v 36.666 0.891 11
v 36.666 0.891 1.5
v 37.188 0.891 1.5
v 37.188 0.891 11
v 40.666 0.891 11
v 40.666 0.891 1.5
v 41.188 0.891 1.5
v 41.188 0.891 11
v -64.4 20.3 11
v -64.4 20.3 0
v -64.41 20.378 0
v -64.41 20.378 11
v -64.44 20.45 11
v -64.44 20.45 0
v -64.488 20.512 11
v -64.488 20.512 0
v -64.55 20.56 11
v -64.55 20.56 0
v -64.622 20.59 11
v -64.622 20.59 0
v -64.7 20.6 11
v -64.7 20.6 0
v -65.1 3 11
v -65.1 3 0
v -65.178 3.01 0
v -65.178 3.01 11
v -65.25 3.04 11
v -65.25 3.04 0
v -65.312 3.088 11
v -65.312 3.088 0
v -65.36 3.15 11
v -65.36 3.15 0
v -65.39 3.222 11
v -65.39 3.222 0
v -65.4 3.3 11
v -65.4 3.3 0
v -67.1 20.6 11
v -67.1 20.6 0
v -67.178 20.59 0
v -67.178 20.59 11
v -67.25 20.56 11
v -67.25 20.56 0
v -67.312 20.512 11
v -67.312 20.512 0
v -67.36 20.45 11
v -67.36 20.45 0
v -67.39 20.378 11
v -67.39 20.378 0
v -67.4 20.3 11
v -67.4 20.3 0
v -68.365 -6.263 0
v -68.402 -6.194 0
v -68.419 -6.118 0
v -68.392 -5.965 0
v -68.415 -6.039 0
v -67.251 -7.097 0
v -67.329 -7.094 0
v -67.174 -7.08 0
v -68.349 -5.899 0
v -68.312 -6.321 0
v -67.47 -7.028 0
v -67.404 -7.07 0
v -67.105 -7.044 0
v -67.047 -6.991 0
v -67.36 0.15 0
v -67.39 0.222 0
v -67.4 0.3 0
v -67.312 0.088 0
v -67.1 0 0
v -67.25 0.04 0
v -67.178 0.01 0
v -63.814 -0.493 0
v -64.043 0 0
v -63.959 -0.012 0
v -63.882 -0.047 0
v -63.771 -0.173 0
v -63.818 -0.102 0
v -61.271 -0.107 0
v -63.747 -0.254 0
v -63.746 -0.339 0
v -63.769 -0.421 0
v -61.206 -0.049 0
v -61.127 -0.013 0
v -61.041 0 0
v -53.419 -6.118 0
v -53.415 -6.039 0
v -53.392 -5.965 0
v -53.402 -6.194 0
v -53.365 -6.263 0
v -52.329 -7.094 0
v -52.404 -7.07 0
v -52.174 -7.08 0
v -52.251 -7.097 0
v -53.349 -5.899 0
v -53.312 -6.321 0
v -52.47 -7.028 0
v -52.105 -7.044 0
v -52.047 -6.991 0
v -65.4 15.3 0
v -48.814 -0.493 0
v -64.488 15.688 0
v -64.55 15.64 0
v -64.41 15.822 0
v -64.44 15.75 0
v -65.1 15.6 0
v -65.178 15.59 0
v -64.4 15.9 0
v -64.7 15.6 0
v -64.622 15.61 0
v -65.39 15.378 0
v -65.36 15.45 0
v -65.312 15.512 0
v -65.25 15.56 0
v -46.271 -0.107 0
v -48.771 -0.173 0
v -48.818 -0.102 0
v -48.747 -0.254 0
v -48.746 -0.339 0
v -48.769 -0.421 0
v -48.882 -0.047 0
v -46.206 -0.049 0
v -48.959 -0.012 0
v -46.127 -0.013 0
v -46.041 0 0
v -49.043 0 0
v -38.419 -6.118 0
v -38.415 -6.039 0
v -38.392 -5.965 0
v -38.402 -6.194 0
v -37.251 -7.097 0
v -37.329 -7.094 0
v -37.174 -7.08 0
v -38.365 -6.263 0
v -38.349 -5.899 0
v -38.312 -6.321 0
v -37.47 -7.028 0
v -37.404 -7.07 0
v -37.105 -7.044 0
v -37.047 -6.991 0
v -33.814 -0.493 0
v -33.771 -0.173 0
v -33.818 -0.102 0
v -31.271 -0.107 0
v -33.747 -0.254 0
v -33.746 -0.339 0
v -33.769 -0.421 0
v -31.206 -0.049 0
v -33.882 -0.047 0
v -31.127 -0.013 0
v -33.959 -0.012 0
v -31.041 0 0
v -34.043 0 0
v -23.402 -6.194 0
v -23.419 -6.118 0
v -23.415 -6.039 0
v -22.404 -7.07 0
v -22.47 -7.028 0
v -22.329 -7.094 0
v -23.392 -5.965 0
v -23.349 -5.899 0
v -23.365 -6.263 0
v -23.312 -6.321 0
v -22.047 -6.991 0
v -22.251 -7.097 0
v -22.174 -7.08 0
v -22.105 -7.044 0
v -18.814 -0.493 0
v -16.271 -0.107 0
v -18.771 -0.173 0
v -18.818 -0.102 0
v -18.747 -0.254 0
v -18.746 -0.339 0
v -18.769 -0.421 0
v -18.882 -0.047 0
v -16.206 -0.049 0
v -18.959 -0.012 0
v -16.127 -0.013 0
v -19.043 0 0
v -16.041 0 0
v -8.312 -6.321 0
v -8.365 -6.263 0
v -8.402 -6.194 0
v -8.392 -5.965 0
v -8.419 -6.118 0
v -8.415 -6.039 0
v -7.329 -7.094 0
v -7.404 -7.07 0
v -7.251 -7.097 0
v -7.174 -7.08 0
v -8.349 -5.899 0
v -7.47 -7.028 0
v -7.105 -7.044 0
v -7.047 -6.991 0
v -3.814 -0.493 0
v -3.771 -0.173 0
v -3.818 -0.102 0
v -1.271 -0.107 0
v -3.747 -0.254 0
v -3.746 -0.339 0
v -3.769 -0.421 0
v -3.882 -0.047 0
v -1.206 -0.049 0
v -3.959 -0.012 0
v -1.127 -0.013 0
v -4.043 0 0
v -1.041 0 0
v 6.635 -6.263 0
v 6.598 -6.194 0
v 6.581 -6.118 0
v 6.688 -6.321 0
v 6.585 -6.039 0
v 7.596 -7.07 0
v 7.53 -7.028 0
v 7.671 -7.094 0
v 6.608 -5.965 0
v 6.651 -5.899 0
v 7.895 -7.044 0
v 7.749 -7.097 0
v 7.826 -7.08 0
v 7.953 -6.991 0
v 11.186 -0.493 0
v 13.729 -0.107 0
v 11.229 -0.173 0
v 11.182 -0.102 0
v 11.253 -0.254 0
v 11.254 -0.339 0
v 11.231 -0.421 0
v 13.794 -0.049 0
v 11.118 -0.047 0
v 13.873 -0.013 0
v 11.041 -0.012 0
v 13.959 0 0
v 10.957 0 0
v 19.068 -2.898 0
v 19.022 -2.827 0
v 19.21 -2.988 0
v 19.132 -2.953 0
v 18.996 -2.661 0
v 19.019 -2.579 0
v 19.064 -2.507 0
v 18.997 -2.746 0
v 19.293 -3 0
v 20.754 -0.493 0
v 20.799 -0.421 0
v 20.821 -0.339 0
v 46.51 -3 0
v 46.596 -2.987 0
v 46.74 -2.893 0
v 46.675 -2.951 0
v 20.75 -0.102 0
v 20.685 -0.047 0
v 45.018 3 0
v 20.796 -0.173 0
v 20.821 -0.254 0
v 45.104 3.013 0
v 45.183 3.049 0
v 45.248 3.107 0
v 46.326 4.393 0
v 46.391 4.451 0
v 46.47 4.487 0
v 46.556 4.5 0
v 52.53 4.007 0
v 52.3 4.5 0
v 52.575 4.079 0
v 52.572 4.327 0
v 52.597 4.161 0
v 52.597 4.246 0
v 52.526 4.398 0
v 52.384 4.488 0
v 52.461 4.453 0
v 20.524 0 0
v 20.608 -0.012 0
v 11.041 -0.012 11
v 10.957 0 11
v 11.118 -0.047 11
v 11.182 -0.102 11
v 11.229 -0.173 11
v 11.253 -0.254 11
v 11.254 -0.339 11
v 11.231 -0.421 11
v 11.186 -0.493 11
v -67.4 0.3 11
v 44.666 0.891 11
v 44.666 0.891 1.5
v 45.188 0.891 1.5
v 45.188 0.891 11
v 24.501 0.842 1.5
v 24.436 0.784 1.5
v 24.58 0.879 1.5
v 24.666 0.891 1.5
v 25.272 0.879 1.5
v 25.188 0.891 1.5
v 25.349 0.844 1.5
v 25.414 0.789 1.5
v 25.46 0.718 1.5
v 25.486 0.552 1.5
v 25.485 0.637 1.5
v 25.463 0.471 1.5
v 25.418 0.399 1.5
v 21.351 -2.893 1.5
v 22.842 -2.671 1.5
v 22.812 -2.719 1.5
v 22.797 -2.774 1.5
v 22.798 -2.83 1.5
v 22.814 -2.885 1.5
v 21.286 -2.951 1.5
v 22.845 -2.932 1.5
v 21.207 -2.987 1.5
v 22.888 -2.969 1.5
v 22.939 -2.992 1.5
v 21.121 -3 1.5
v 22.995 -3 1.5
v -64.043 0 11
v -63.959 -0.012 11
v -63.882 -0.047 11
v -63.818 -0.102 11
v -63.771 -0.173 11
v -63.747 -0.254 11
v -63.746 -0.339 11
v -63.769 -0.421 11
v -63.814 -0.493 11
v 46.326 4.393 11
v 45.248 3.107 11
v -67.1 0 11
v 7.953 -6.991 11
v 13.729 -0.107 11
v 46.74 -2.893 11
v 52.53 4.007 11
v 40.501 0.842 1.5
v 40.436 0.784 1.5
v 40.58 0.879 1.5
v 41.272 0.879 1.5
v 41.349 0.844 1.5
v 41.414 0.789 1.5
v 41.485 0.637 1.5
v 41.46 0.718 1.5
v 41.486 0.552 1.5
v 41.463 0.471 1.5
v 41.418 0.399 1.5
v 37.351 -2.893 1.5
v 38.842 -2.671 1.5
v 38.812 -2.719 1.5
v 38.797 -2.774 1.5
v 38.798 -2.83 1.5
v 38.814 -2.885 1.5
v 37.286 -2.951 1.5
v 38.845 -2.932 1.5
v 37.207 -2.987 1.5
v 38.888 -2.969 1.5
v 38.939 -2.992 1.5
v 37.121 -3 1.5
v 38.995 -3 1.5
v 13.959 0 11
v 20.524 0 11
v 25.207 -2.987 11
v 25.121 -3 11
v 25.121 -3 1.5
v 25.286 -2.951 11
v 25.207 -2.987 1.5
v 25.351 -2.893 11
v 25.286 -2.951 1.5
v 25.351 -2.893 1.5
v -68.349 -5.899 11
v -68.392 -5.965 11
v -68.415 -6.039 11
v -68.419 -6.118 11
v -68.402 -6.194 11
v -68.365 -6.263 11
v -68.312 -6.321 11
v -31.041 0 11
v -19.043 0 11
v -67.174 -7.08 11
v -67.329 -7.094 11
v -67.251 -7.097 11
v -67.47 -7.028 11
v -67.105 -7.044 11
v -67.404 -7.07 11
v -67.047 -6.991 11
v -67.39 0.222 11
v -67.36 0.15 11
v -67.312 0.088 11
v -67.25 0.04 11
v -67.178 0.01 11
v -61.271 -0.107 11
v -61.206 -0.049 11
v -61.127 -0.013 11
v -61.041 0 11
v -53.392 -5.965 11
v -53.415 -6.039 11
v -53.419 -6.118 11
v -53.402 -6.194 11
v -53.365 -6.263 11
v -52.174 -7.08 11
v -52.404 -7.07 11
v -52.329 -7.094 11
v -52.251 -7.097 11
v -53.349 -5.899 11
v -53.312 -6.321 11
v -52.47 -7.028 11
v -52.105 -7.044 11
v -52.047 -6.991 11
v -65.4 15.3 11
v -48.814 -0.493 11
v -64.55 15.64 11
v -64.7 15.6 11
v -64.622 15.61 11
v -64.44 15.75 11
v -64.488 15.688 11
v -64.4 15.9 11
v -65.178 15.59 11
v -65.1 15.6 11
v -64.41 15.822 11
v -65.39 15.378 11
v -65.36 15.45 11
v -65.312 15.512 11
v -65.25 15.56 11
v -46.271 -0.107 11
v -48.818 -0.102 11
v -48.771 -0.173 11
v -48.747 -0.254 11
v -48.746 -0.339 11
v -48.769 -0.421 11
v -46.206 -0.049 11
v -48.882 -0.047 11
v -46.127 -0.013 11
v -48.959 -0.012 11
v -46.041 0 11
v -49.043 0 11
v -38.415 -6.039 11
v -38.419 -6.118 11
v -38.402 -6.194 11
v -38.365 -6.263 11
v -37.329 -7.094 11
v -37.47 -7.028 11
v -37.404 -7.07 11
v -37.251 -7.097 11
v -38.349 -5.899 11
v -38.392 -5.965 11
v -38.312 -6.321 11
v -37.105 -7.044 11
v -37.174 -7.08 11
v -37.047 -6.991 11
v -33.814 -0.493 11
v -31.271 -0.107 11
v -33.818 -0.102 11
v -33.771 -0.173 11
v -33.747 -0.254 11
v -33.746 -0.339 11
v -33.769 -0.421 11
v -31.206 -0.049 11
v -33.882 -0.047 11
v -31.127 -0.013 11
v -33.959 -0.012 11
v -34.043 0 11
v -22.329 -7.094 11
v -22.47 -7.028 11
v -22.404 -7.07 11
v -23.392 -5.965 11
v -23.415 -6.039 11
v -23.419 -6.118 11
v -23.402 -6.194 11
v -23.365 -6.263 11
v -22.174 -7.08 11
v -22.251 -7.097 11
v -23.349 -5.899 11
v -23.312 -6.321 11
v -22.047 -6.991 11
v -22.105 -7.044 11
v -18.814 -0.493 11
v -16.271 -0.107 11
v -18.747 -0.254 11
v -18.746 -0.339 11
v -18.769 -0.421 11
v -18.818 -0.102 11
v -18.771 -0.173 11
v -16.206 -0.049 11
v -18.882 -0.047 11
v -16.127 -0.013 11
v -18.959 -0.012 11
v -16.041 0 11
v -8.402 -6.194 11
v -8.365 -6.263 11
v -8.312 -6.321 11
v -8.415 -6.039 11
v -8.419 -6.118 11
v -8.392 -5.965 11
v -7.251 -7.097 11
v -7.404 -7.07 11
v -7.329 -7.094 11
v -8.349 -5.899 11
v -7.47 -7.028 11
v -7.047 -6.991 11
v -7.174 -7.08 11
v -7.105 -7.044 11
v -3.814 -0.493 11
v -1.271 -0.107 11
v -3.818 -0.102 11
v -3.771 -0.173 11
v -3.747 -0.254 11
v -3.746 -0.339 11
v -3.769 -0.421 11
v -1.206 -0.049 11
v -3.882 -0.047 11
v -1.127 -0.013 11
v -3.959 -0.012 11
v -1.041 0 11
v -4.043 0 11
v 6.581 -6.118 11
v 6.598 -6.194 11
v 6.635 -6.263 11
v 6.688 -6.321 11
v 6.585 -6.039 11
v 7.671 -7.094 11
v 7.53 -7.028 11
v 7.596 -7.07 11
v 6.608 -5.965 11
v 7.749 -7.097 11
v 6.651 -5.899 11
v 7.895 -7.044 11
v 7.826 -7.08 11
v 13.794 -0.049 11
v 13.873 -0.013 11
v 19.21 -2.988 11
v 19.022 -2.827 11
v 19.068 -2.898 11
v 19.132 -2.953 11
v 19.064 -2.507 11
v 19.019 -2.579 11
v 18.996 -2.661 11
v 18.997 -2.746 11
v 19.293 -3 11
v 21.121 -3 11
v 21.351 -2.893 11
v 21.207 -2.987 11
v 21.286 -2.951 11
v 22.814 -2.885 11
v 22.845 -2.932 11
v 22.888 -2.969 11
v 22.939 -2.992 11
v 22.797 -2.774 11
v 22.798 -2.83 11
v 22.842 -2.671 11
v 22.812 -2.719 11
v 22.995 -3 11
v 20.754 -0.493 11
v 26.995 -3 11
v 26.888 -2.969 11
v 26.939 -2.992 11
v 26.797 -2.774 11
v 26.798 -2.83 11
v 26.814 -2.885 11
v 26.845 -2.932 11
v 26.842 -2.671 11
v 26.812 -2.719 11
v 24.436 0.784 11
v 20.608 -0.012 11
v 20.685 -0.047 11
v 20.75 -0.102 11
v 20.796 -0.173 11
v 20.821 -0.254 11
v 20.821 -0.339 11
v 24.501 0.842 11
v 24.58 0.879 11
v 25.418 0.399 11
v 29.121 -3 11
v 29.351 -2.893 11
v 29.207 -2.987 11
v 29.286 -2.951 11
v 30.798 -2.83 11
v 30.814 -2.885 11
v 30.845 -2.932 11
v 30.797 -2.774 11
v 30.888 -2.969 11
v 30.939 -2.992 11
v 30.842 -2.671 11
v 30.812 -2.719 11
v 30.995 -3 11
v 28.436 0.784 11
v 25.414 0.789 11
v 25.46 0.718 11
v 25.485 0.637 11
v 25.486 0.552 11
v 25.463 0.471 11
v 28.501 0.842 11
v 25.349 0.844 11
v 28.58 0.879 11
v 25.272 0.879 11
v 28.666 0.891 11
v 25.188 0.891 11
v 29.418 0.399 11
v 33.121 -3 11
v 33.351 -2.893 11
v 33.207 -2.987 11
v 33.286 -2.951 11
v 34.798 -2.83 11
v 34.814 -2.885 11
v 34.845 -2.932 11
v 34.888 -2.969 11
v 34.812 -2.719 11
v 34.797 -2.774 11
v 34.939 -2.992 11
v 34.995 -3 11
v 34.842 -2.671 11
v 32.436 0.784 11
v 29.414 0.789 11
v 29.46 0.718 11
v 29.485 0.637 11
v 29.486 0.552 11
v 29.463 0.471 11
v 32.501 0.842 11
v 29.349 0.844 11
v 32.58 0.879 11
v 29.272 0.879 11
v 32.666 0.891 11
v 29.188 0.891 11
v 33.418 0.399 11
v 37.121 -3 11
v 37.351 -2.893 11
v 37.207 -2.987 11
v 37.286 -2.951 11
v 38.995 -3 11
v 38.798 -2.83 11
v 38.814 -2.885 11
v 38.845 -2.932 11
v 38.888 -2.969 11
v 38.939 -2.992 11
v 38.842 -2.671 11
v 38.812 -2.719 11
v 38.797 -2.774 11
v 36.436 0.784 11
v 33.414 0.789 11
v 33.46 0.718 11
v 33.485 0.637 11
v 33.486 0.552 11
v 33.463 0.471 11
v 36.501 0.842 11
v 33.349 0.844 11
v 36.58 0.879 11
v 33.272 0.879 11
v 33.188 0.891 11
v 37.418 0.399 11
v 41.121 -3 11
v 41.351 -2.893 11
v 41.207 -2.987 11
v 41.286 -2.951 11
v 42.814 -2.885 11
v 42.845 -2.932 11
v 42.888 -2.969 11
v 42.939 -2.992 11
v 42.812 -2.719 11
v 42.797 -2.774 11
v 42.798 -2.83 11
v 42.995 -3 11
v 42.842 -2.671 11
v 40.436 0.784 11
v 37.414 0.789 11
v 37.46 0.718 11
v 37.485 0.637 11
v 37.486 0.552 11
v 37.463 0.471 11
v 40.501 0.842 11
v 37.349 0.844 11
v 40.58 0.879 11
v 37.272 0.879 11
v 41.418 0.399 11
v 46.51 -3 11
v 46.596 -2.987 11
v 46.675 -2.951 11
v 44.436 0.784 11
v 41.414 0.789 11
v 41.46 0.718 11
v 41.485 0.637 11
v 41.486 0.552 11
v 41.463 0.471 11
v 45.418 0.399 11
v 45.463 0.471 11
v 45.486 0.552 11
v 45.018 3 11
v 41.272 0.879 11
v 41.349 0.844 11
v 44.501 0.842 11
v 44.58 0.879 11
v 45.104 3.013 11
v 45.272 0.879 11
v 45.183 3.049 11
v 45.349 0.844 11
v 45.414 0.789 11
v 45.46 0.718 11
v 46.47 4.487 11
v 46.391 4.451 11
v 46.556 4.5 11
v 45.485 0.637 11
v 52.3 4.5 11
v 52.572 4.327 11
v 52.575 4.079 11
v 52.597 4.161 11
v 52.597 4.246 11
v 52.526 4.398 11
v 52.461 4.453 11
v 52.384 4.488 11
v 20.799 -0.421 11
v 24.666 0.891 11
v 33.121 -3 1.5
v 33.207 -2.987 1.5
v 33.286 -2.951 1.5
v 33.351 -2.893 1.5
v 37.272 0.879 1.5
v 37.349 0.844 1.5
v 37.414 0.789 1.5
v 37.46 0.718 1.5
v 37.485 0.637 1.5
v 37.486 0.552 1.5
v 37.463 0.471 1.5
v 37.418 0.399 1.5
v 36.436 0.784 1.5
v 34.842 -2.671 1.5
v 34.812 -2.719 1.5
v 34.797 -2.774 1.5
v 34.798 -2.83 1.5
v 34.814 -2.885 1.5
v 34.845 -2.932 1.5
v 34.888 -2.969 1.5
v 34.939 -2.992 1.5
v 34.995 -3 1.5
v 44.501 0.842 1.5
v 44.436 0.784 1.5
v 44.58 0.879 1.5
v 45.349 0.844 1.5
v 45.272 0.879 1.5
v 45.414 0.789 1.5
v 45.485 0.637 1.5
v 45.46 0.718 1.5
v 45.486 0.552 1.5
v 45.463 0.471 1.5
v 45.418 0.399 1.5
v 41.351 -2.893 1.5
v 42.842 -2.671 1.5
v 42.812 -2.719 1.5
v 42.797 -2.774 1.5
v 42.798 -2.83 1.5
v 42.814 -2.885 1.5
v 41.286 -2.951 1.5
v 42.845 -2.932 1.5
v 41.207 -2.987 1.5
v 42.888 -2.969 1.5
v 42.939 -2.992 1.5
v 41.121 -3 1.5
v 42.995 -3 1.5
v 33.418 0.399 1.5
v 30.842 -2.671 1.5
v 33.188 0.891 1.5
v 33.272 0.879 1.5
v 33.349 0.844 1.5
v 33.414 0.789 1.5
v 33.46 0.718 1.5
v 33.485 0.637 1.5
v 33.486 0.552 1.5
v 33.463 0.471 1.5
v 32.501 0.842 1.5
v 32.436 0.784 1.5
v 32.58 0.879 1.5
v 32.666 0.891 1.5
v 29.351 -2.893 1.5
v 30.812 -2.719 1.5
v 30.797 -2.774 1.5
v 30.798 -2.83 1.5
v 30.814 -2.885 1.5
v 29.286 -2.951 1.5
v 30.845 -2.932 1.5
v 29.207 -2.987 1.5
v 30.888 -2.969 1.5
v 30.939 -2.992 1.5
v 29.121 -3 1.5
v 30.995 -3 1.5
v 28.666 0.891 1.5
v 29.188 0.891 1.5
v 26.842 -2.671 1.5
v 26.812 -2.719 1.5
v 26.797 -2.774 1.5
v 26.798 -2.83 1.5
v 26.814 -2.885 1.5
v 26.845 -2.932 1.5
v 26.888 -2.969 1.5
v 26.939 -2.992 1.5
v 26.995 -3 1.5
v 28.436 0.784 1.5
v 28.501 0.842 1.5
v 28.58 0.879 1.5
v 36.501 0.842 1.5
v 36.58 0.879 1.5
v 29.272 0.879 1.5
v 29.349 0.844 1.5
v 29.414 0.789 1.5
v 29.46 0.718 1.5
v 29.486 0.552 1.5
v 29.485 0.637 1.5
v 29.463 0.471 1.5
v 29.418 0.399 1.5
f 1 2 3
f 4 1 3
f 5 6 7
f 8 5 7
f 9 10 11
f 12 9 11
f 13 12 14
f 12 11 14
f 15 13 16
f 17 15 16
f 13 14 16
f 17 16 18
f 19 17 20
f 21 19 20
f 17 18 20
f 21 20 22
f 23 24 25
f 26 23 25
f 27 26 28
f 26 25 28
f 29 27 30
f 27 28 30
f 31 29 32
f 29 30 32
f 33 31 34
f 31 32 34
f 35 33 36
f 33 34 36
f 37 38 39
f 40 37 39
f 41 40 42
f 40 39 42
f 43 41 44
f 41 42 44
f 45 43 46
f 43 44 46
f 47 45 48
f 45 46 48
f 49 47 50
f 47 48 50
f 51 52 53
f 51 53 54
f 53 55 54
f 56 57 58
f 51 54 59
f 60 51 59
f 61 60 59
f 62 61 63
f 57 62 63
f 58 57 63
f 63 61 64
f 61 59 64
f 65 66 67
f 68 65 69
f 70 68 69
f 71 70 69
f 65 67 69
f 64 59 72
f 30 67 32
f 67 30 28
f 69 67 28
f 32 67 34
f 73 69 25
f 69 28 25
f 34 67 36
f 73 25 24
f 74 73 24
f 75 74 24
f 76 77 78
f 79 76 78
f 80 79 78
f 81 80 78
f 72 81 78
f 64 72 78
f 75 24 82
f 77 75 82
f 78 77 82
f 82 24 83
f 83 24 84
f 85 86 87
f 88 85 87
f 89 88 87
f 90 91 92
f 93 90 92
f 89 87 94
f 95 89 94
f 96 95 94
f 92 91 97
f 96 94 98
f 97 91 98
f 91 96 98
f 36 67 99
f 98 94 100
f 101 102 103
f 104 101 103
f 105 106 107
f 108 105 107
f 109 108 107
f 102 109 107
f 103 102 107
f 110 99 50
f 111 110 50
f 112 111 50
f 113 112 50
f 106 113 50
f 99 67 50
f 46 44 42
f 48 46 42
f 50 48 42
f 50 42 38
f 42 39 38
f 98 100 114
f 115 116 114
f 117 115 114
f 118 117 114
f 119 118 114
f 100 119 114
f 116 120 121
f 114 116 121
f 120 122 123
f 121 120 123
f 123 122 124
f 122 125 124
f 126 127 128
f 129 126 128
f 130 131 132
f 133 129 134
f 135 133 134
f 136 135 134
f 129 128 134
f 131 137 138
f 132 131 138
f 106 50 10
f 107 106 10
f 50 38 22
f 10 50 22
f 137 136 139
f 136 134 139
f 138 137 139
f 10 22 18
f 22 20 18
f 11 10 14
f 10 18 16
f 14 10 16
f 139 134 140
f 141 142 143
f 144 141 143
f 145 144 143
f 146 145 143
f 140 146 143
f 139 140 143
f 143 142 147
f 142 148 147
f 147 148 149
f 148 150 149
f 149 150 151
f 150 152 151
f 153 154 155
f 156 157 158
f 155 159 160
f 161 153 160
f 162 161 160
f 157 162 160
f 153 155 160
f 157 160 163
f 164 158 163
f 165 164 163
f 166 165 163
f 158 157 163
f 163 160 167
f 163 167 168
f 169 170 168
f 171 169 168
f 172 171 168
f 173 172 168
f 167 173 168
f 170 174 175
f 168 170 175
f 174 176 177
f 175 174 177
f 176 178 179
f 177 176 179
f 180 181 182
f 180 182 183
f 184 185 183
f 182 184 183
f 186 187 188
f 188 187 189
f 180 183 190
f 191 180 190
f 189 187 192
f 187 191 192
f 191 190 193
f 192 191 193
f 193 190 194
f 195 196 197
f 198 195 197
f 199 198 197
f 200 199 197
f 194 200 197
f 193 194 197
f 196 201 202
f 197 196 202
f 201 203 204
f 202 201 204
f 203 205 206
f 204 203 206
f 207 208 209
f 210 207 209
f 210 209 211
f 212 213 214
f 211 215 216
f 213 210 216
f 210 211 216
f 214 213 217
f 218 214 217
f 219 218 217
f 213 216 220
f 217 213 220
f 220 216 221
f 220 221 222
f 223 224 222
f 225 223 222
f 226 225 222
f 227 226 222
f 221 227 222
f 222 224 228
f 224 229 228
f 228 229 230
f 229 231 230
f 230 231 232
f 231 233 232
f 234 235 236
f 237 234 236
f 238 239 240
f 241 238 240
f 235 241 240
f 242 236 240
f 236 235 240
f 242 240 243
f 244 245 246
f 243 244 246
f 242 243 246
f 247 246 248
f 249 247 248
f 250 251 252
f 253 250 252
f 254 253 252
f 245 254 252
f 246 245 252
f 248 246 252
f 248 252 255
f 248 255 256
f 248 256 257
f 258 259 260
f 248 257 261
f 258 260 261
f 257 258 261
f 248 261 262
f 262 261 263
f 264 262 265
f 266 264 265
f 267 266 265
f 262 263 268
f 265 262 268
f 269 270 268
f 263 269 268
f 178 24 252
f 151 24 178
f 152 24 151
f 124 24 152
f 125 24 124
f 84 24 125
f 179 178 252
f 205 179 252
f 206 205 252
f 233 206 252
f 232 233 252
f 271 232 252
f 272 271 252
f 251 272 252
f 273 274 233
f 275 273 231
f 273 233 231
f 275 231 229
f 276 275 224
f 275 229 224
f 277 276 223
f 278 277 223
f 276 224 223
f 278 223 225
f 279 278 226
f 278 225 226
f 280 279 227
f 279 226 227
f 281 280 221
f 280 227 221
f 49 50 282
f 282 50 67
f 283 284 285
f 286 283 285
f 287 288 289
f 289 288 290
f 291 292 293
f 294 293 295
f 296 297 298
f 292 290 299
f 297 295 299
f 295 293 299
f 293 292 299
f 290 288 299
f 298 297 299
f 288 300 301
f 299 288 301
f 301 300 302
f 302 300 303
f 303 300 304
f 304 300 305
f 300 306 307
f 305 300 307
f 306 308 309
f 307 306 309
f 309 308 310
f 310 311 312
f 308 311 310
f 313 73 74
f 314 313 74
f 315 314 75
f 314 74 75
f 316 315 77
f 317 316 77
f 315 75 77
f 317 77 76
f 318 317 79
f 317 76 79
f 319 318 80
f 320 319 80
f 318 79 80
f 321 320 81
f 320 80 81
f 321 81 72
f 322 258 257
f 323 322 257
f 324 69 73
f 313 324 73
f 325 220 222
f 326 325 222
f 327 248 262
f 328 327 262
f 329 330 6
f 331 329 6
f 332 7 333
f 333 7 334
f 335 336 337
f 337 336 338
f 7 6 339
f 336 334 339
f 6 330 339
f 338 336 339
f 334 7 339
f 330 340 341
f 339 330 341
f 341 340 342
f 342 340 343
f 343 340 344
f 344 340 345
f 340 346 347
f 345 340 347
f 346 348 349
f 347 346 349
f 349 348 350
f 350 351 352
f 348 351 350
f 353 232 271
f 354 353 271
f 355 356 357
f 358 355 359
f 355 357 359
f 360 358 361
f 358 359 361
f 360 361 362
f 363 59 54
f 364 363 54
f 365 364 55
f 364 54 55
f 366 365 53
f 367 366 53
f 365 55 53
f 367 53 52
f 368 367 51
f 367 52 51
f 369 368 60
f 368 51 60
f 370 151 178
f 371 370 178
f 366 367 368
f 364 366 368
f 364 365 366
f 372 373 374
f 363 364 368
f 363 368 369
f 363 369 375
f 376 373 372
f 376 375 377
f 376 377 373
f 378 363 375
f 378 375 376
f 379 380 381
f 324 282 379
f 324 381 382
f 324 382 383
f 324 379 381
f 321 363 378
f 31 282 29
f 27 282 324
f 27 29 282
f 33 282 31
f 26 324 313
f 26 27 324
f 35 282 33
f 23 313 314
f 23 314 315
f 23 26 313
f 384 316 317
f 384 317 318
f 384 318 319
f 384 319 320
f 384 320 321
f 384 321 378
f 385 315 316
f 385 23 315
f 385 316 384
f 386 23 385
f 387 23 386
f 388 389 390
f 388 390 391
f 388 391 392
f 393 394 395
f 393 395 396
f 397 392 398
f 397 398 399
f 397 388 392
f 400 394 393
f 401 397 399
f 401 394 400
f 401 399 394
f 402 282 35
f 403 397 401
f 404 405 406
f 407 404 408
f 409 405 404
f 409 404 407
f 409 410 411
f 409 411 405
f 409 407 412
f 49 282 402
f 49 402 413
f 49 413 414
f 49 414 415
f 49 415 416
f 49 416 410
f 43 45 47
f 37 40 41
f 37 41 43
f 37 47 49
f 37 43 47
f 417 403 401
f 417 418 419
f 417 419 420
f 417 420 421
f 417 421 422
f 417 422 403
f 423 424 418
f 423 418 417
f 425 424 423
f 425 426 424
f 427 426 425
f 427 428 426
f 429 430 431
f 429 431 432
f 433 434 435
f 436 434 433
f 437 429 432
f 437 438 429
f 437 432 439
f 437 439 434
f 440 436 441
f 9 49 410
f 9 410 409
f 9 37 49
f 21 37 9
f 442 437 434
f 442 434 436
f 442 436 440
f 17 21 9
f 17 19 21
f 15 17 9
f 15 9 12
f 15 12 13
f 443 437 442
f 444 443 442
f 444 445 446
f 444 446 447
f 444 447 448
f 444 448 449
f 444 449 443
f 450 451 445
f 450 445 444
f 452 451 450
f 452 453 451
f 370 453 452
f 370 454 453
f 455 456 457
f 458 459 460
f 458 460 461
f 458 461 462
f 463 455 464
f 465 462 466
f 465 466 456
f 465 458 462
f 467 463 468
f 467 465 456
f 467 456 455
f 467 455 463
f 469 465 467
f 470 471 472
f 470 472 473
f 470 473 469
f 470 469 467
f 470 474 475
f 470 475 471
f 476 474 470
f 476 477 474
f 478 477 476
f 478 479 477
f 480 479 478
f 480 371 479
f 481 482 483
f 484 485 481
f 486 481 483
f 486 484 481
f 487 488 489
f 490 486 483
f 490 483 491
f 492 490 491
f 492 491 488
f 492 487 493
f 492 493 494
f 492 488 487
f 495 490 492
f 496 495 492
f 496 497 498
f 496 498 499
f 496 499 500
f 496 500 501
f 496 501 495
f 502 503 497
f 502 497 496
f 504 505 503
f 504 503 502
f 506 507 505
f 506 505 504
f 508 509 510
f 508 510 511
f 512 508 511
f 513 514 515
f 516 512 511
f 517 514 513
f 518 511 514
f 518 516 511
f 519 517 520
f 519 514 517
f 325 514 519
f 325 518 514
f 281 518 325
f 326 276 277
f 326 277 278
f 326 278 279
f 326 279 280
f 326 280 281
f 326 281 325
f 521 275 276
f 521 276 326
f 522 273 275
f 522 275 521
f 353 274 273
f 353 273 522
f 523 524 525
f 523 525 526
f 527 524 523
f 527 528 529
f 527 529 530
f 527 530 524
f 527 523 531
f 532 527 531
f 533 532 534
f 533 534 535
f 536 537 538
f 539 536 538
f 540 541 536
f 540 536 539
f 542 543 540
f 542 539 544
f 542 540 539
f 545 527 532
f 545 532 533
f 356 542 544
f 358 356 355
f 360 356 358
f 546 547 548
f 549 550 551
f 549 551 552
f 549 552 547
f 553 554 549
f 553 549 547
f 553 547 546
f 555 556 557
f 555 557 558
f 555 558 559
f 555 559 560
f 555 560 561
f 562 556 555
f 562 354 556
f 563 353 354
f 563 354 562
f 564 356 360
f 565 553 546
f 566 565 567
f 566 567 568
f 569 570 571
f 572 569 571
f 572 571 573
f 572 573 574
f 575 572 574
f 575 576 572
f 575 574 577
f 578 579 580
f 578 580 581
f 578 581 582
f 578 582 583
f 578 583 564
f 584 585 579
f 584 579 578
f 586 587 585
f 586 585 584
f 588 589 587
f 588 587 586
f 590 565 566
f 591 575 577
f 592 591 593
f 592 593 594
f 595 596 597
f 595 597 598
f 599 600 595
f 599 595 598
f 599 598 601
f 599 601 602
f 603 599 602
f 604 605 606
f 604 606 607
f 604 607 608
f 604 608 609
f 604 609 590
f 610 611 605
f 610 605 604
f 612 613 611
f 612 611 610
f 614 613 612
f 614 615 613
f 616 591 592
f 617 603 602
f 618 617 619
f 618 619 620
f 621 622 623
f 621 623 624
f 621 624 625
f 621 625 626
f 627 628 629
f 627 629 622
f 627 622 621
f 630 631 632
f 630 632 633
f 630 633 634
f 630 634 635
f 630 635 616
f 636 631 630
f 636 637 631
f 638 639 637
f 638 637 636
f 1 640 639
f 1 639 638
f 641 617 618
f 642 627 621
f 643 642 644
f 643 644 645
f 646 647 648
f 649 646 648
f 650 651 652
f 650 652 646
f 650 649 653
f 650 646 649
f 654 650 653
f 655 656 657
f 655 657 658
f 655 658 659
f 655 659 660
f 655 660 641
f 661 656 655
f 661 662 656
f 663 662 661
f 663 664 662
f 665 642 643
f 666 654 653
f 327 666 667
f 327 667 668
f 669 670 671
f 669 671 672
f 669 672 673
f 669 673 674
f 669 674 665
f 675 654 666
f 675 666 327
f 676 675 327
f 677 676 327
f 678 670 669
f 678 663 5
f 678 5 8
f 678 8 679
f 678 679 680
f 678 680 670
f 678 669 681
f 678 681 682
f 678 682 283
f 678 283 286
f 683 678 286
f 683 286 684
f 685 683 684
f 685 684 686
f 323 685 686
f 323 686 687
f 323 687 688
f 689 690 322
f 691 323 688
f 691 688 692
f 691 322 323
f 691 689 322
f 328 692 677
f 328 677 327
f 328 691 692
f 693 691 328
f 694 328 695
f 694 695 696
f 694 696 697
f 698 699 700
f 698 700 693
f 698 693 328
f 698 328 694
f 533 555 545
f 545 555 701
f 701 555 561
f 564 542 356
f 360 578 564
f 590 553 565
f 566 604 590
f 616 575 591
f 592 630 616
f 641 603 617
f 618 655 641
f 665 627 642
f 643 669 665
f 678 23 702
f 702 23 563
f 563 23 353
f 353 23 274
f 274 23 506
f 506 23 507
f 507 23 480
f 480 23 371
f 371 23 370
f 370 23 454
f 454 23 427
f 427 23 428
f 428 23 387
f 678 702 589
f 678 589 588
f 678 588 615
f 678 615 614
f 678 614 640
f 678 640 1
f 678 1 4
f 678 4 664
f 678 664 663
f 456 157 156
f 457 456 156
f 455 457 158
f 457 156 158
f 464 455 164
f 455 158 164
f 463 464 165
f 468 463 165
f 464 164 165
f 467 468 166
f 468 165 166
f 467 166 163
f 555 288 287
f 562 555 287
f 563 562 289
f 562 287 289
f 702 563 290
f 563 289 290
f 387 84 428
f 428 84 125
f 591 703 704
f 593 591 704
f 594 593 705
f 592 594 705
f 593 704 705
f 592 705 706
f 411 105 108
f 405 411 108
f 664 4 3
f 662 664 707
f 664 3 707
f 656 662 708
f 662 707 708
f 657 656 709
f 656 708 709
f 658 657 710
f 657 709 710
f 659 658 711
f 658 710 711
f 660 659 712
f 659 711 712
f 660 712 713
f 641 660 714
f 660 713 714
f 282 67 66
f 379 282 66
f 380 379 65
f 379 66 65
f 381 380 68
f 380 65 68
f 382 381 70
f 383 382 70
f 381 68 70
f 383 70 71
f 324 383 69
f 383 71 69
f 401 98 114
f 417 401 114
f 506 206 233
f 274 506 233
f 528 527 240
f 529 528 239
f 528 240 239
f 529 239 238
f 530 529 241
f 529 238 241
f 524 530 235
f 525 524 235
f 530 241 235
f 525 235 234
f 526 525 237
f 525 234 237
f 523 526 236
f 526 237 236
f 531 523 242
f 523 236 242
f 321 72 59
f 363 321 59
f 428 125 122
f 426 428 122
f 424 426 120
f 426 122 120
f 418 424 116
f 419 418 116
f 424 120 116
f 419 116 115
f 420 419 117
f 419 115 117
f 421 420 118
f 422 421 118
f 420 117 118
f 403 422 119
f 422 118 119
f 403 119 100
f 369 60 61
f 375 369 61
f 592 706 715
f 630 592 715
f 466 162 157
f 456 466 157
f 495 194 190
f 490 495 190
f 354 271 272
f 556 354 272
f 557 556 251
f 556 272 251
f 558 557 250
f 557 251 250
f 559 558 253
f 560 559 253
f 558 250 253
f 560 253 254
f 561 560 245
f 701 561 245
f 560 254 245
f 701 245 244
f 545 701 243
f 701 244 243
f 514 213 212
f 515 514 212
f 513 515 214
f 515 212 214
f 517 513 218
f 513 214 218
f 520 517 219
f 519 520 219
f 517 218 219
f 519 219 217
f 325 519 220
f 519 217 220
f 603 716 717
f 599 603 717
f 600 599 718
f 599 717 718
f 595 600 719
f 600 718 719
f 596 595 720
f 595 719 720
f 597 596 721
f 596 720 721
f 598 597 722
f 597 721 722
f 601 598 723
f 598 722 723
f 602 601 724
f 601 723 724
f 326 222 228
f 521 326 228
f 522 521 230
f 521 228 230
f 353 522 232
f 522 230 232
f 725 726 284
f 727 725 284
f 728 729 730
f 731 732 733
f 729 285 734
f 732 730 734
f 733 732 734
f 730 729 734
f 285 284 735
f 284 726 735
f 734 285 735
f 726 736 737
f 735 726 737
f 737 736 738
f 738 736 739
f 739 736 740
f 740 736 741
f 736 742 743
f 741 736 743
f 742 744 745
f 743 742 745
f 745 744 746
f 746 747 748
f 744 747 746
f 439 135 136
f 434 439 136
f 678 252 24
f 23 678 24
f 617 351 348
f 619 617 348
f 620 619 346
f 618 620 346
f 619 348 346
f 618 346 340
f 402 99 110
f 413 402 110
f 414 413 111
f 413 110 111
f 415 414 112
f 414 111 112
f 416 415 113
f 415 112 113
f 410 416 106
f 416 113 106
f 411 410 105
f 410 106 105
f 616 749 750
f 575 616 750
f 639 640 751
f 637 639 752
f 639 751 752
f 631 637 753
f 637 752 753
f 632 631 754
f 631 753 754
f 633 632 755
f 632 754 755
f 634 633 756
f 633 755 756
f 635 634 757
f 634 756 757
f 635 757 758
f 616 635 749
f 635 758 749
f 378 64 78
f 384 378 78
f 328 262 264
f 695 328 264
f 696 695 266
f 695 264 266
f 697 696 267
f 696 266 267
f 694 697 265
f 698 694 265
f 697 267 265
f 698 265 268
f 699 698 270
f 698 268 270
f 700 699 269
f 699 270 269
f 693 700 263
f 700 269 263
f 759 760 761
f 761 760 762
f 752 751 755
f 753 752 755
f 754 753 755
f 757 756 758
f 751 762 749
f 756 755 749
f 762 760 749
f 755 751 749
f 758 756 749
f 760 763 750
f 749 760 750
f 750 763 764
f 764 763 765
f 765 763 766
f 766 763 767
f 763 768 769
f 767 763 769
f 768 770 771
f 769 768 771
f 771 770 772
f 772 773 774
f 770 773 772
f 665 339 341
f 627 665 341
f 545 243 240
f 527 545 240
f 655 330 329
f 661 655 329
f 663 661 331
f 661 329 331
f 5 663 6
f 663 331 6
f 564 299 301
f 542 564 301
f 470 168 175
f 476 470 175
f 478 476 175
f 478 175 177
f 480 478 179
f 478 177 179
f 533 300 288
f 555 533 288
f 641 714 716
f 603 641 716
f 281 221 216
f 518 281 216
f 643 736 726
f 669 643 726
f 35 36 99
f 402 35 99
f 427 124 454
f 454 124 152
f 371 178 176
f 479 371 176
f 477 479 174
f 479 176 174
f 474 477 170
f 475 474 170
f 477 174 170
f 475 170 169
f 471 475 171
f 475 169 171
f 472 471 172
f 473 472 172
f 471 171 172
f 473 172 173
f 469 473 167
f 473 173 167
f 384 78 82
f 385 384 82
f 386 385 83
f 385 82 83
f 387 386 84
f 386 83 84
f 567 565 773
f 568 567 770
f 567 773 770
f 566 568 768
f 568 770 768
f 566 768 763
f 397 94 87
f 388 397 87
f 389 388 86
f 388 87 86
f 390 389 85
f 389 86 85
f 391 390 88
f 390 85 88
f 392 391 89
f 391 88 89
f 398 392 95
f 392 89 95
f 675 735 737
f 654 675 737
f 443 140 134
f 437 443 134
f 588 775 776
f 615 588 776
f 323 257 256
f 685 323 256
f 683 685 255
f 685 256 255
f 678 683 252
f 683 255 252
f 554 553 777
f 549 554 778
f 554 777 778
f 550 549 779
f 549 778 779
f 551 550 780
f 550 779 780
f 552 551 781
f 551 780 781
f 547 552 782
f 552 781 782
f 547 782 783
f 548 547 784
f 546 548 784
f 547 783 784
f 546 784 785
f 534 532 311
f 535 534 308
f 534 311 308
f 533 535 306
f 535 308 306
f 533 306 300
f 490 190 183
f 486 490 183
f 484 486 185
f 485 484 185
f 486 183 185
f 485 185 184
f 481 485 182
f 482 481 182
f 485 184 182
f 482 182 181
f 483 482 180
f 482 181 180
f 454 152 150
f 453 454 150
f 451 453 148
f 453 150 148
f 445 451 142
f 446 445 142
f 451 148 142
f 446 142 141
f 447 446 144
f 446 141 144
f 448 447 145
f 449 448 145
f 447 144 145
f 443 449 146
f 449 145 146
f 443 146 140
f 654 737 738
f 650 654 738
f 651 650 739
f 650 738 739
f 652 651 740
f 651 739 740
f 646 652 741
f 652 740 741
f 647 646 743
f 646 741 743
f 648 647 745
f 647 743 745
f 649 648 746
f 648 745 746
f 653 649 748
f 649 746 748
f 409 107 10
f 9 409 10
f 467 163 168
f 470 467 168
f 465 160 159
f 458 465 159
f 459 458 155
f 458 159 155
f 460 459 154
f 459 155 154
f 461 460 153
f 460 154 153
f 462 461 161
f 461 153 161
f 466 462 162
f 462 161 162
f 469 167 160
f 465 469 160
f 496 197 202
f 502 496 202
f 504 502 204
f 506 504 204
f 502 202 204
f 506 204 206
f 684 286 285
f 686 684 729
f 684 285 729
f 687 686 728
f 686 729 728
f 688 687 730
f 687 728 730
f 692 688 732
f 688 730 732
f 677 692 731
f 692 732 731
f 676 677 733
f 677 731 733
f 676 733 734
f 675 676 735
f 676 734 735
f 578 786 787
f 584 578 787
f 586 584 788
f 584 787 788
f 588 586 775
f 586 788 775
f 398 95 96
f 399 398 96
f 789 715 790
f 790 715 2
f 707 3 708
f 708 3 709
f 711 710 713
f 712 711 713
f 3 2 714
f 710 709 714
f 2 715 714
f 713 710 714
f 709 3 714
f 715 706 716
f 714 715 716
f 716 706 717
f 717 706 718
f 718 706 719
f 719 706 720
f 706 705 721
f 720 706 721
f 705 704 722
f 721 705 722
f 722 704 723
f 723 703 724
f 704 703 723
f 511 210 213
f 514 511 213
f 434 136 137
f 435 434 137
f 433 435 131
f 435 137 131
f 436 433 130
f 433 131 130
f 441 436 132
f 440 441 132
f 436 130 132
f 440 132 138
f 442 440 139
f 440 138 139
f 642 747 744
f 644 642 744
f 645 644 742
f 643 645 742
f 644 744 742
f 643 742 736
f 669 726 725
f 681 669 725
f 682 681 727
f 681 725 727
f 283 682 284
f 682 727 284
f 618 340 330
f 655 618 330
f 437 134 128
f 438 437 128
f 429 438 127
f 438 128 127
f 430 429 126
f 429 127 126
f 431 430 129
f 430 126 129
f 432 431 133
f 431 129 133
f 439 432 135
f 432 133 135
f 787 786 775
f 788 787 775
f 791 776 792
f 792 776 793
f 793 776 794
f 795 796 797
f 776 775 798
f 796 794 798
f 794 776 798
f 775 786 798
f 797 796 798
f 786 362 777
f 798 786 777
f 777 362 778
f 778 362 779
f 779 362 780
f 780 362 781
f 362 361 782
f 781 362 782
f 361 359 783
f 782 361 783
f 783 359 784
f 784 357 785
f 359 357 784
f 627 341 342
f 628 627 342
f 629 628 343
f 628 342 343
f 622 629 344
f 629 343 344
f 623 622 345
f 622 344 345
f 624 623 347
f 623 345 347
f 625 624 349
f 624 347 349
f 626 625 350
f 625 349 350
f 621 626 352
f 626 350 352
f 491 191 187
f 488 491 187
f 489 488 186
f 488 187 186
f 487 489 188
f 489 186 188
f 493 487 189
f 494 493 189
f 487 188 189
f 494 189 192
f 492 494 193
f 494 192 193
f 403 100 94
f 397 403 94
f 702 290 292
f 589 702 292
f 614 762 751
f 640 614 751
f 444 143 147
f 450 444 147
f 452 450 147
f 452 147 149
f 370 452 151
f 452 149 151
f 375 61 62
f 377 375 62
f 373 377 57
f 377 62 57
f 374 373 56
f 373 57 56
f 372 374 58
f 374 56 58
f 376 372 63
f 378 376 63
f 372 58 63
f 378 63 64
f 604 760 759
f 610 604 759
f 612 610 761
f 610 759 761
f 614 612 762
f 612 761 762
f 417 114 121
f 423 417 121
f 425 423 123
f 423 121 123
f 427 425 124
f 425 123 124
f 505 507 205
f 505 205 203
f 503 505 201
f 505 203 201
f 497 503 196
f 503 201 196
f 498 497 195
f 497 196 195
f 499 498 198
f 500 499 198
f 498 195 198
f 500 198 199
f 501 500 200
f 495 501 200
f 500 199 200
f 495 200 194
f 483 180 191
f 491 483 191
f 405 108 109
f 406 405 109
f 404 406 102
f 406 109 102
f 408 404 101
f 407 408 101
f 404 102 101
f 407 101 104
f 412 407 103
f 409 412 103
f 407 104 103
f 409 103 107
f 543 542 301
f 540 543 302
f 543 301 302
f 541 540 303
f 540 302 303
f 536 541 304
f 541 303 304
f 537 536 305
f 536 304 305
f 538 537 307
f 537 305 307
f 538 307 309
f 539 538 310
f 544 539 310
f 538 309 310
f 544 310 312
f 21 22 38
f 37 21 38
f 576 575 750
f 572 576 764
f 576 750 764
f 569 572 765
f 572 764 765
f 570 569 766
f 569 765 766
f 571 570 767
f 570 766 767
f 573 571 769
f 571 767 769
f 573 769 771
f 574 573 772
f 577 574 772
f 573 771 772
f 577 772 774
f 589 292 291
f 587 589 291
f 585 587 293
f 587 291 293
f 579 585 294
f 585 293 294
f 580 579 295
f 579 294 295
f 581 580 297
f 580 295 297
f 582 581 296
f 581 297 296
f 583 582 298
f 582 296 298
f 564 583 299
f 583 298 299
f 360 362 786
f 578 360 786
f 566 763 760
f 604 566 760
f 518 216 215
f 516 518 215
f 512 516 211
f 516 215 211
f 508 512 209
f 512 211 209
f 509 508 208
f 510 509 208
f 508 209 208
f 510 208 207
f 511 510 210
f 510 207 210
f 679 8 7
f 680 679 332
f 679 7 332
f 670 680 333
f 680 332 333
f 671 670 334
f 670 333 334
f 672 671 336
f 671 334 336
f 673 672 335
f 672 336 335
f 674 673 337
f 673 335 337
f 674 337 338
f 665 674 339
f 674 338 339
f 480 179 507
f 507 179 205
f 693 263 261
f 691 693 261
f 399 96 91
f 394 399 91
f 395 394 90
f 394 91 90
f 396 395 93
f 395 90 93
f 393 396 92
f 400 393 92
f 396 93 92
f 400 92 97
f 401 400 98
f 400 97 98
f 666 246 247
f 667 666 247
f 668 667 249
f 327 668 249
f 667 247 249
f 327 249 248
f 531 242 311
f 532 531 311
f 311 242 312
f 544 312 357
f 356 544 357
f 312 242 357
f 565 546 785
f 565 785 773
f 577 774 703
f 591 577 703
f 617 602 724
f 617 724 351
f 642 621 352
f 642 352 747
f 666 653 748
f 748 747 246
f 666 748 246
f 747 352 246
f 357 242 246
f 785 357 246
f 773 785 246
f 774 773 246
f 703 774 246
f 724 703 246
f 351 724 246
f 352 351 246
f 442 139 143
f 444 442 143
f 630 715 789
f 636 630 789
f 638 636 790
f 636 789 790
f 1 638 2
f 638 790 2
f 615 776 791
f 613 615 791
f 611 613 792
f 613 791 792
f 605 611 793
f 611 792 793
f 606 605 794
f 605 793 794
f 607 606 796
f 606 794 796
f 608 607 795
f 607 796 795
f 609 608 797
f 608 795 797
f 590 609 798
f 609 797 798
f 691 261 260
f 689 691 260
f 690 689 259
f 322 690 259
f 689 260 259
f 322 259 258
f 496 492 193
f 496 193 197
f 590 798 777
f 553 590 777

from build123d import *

# Parameters (mm, degrees)
F1_DEPTH = 11
F3_DEPTH = 1.5


with BuildPart() as f1:
    # F0 (on Top) → F1 (new body)
    with BuildSketch(Plane.XY):
        with BuildLine():
            ThreePointArc((-67.1, 20.6), (-67.312132, 20.512132), (-67.4, 20.3))
            Line((-67.4, 20.3), (-67.4, 0.3))
            ThreePointArc((-67.4, 0.3), (-67.312132, 0.087868), (-67.1, 0))
            Line((-67.1, 0), (-64.043352, 0))
            ThreePointArc((-64.043352, 0), (-63.77146, -0.173215), (-63.813539, -0.492836))
            Line((-63.813539, -0.492836), (-68.349465, -5.898542))
            ThreePointArc((-68.349465, -5.898542), (-68.41851, -6.117525), (-68.312488, -6.321192))
            Line((-68.312488, -6.321192), (-67.469839, -7.028258))
            ThreePointArc((-67.469839, -7.028258), (-67.250856, -7.097303), (-67.047189, -6.991281))
            Line((-67.047189, -6.991281), (-61.270729, -0.107164))
            ThreePointArc((-61.270729, -0.107164), (-61.167701, -0.028108), (-61.040915, 0))
            Line((-61.040915, 0), (-49.043352, 0))
            ThreePointArc((-49.043352, 0), (-48.77146, -0.173215), (-48.813539, -0.492836))
            Line((-48.813539, -0.492836), (-53.349465, -5.898542))
            ThreePointArc((-53.349465, -5.898542), (-53.41851, -6.117525), (-53.312488, -6.321192))
            Line((-53.312488, -6.321192), (-52.469839, -7.028258))
            ThreePointArc((-52.469839, -7.028258), (-52.250856, -7.097303), (-52.047189, -6.991281))
            Line((-52.047189, -6.991281), (-46.270729, -0.107164))
            ThreePointArc((-46.270729, -0.107164), (-46.167701, -0.028108), (-46.040915, 0))
            Line((-46.040915, 0), (-34.043352, 0))
            ThreePointArc((-34.043352, 0), (-33.77146, -0.173215), (-33.813539, -0.492836))
            Line((-33.813539, -0.492836), (-38.349465, -5.898542))
            ThreePointArc((-38.349465, -5.898542), (-38.41851, -6.117525), (-38.312488, -6.321192))
            Line((-38.312488, -6.321192), (-37.469839, -7.028258))
            ThreePointArc((-37.469839, -7.028258), (-37.250856, -7.097303), (-37.047189, -6.991281))
            Line((-37.047189, -6.991281), (-31.270729, -0.107164))
            ThreePointArc((-31.270729, -0.107164), (-31.167701, -0.028108), (-31.040915, 0))
            Line((-31.040915, 0), (-19.043352, 0))
            ThreePointArc((-19.043352, 0), (-18.77146, -0.173215), (-18.813539, -0.492836))
            Line((-18.813539, -0.492836), (-23.349465, -5.898542))
            ThreePointArc((-23.349465, -5.898542), (-23.41851, -6.117525), (-23.312488, -6.321192))
            Line((-23.312488, -6.321192), (-22.469839, -7.028258))
            ThreePointArc((-22.469839, -7.028258), (-22.250856, -7.097303), (-22.047189, -6.991281))
            Line((-22.047189, -6.991281), (-16.270729, -0.107164))
            ThreePointArc((-16.270729, -0.107164), (-16.167701, -0.028108), (-16.040915, 0))
            Line((-16.040915, 0), (-4.043352, 0))
            ThreePointArc((-4.043352, 0), (-3.77146, -0.173215), (-3.813539, -0.492836))
            Line((-3.813539, -0.492836), (-8.349465, -5.898542))
            ThreePointArc((-8.349465, -5.898542), (-8.41851, -6.117525), (-8.312488, -6.321192))
            Line((-8.312488, -6.321192), (-7.469839, -7.028258))
            ThreePointArc((-7.469839, -7.028258), (-7.250856, -7.097303), (-7.047189, -6.991281))
            Line((-7.047189, -6.991281), (-1.270729, -0.107164))
            ThreePointArc((-1.270729, -0.107164), (-1.167701, -0.028108), (-1.040915, 0))
            Line((-1.040915, 0), (10.956648, 0))
            ThreePointArc((10.956648, 0), (11.22854, -0.173215), (11.186461, -0.492836))
            Line((11.186461, -0.492836), (6.650535, -5.898542))
            ThreePointArc((6.650535, -5.898542), (6.58149, -6.117525), (6.687512, -6.321192))
            Line((6.687512, -6.321192), (7.530161, -7.028258))
            ThreePointArc((7.530161, -7.028258), (7.749144, -7.097303), (7.952811, -6.991281))
            Line((7.952811, -6.991281), (13.729271, -0.107164))
            ThreePointArc((13.729271, -0.107164), (13.832299, -0.028108), (13.959085, 0))
            Line((13.959085, 0), (20.524052, 0))
            ThreePointArc((20.524052, 0), (20.795944, -0.173215), (20.753865, -0.492836))
            Line((20.753865, -0.492836), (19.063644, -2.507164))
            ThreePointArc((19.063644, -2.507164), (19.021565, -2.826785), (19.293457, -3))
            Line((19.293457, -3), (21.121027, -3))
            ThreePointArc((21.121027, -3), (21.247813, -2.971892), (21.35084, -2.892836))
            Line((21.35084, -2.892836), (24.436221, 0.784177))
            ThreePointArc((24.436221, 0.784177), (24.539249, 0.863233), (24.666034, 0.891341))
            Line((24.666034, 0.891341), (25.188197, 0.891341))
            ThreePointArc((25.188197, 0.891341), (25.46009, 0.718126), (25.418011, 0.398504))
            Line((25.418011, 0.398504), (22.842019, -2.671442))
            ThreePointArc((22.842019, -2.671442), (22.813967, -2.884524), (22.995228, -3))
            Line((22.995228, -3), (25.121027, -3))
            ThreePointArc((25.121027, -3), (25.247813, -2.971892), (25.35084, -2.892836))
            Line((25.35084, -2.892836), (28.436221, 0.784177))
            ThreePointArc((28.436221, 0.784177), (28.539249, 0.863233), (28.666034, 0.891341))
            Line((28.666034, 0.891341), (29.188197, 0.891341))
            ThreePointArc((29.188197, 0.891341), (29.46009, 0.718126), (29.418011, 0.398504))
            Line((29.418011, 0.398504), (26.842019, -2.671442))
            ThreePointArc((26.842019, -2.671442), (26.813967, -2.884524), (26.995228, -3))
            Line((26.995228, -3), (29.121027, -3))
            ThreePointArc((29.121027, -3), (29.247813, -2.971892), (29.35084, -2.892836))
            Line((29.35084, -2.892836), (32.436221, 0.784177))
            ThreePointArc((32.436221, 0.784177), (32.539249, 0.863233), (32.666034, 0.891341))
            Line((32.666034, 0.891341), (33.188197, 0.891341))
            ThreePointArc((33.188197, 0.891341), (33.46009, 0.718126), (33.418011, 0.398504))
            Line((33.418011, 0.398504), (30.842019, -2.671442))
            ThreePointArc((30.842019, -2.671442), (30.813967, -2.884524), (30.995228, -3))
            Line((30.995228, -3), (33.121027, -3))
            ThreePointArc((33.121027, -3), (33.247813, -2.971892), (33.35084, -2.892836))
            Line((33.35084, -2.892836), (36.436221, 0.784177))
            ThreePointArc((36.436221, 0.784177), (36.539249, 0.863233), (36.666034, 0.891341))
            Line((36.666034, 0.891341), (37.188197, 0.891341))
            ThreePointArc((37.188197, 0.891341), (37.46009, 0.718126), (37.418011, 0.398504))
            Line((37.418011, 0.398504), (34.842019, -2.671442))
            ThreePointArc((34.842019, -2.671442), (34.813967, -2.884524), (34.995228, -3))
            Line((34.995228, -3), (37.121027, -3))
            ThreePointArc((37.121027, -3), (37.247813, -2.971892), (37.35084, -2.892836))
            Line((37.35084, -2.892836), (40.436221, 0.784177))
            ThreePointArc((40.436221, 0.784177), (40.539249, 0.863233), (40.666034, 0.891341))
            Line((40.666034, 0.891341), (41.188197, 0.891341))
            ThreePointArc((41.188197, 0.891341), (41.46009, 0.718126), (41.418011, 0.398504))
            Line((41.418011, 0.398504), (38.842019, -2.671442))
            ThreePointArc((38.842019, -2.671442), (38.813967, -2.884524), (38.995228, -3))
            Line((38.995228, -3), (41.121027, -3))
            ThreePointArc((41.121027, -3), (41.247813, -2.971892), (41.35084, -2.892836))
            Line((41.35084, -2.892836), (44.436221, 0.784177))
            ThreePointArc((44.436221, 0.784177), (44.539249, 0.863233), (44.666034, 0.891341))
            Line((44.666034, 0.891341), (45.188197, 0.891341))
            ThreePointArc((45.188197, 0.891341), (45.46009, 0.718126), (45.418011, 0.398504))
            Line((45.418011, 0.398504), (42.842019, -2.671442))
            ThreePointArc((42.842019, -2.671442), (42.813967, -2.884524), (42.995228, -3))
            Line((42.995228, -3), (46.510213, -3))
            ThreePointArc((46.510213, -3), (46.636998, -2.971892), (46.740026, -2.892836))
            Line((46.740026, -2.892836), (52.529813, 4.007164))
            ThreePointArc((52.529813, 4.007164), (52.571892, 4.326785), (52.3, 4.5))
            Line((52.3, 4.5), (46.556208, 4.5))
            ThreePointArc((46.556208, 4.5), (46.429422, 4.471892), (46.326395, 4.392836))
            Line((46.326395, 4.392836), (45.247587, 3.107164))
            ThreePointArc((45.247587, 3.107164), (45.144559, 3.028108), (45.017774, 3))
            Line((45.017774, 3), (-65.1, 3))
            ThreePointArc((-65.1, 3), (-65.312132, 3.087868), (-65.4, 3.3))
            Line((-65.4, 3.3), (-65.4, 15.3))
            ThreePointArc((-65.4, 15.3), (-65.312132, 15.512132), (-65.1, 15.6))
            Line((-65.1, 15.6), (-64.7, 15.6))
            ThreePointArc((-64.7, 15.6), (-64.487868, 15.687868), (-64.4, 15.9))
            Line((-64.4, 15.9), (-64.4, 20.3))
            ThreePointArc((-64.4, 20.3), (-64.487868, 20.512132), (-64.7, 20.6))
            Line((-64.7, 20.6), (-67.1, 20.6))
        make_face()
    extrude(amount=F1_DEPTH)

    # F2 (on face) → F3 (join)
    with BuildSketch(Plane(origin=(0, 0, 0), x_dir=(1, 0, 0), z_dir=(0, 0, -1))):
        with BuildLine():
            Line((23.684703, -3), (51.041351, -3))
            ThreePointArc((51.041351, -3), (51.313243, -2.826785), (51.271164, -2.507164))
            Line((51.271164, -2.507164), (46.740026, 2.892836))
            ThreePointArc((46.740026, 2.892836), (46.636998, 2.971892), (46.510213, 3))
            Line((46.510213, 3), (19.293457, 3))
            ThreePointArc((19.293457, 3), (19.021565, 2.826785), (19.063644, 2.507164))
            Line((19.063644, 2.507164), (23.684703, -3))
        make_face()
    extrude(amount=-F3_DEPTH)


solid = f1.part
